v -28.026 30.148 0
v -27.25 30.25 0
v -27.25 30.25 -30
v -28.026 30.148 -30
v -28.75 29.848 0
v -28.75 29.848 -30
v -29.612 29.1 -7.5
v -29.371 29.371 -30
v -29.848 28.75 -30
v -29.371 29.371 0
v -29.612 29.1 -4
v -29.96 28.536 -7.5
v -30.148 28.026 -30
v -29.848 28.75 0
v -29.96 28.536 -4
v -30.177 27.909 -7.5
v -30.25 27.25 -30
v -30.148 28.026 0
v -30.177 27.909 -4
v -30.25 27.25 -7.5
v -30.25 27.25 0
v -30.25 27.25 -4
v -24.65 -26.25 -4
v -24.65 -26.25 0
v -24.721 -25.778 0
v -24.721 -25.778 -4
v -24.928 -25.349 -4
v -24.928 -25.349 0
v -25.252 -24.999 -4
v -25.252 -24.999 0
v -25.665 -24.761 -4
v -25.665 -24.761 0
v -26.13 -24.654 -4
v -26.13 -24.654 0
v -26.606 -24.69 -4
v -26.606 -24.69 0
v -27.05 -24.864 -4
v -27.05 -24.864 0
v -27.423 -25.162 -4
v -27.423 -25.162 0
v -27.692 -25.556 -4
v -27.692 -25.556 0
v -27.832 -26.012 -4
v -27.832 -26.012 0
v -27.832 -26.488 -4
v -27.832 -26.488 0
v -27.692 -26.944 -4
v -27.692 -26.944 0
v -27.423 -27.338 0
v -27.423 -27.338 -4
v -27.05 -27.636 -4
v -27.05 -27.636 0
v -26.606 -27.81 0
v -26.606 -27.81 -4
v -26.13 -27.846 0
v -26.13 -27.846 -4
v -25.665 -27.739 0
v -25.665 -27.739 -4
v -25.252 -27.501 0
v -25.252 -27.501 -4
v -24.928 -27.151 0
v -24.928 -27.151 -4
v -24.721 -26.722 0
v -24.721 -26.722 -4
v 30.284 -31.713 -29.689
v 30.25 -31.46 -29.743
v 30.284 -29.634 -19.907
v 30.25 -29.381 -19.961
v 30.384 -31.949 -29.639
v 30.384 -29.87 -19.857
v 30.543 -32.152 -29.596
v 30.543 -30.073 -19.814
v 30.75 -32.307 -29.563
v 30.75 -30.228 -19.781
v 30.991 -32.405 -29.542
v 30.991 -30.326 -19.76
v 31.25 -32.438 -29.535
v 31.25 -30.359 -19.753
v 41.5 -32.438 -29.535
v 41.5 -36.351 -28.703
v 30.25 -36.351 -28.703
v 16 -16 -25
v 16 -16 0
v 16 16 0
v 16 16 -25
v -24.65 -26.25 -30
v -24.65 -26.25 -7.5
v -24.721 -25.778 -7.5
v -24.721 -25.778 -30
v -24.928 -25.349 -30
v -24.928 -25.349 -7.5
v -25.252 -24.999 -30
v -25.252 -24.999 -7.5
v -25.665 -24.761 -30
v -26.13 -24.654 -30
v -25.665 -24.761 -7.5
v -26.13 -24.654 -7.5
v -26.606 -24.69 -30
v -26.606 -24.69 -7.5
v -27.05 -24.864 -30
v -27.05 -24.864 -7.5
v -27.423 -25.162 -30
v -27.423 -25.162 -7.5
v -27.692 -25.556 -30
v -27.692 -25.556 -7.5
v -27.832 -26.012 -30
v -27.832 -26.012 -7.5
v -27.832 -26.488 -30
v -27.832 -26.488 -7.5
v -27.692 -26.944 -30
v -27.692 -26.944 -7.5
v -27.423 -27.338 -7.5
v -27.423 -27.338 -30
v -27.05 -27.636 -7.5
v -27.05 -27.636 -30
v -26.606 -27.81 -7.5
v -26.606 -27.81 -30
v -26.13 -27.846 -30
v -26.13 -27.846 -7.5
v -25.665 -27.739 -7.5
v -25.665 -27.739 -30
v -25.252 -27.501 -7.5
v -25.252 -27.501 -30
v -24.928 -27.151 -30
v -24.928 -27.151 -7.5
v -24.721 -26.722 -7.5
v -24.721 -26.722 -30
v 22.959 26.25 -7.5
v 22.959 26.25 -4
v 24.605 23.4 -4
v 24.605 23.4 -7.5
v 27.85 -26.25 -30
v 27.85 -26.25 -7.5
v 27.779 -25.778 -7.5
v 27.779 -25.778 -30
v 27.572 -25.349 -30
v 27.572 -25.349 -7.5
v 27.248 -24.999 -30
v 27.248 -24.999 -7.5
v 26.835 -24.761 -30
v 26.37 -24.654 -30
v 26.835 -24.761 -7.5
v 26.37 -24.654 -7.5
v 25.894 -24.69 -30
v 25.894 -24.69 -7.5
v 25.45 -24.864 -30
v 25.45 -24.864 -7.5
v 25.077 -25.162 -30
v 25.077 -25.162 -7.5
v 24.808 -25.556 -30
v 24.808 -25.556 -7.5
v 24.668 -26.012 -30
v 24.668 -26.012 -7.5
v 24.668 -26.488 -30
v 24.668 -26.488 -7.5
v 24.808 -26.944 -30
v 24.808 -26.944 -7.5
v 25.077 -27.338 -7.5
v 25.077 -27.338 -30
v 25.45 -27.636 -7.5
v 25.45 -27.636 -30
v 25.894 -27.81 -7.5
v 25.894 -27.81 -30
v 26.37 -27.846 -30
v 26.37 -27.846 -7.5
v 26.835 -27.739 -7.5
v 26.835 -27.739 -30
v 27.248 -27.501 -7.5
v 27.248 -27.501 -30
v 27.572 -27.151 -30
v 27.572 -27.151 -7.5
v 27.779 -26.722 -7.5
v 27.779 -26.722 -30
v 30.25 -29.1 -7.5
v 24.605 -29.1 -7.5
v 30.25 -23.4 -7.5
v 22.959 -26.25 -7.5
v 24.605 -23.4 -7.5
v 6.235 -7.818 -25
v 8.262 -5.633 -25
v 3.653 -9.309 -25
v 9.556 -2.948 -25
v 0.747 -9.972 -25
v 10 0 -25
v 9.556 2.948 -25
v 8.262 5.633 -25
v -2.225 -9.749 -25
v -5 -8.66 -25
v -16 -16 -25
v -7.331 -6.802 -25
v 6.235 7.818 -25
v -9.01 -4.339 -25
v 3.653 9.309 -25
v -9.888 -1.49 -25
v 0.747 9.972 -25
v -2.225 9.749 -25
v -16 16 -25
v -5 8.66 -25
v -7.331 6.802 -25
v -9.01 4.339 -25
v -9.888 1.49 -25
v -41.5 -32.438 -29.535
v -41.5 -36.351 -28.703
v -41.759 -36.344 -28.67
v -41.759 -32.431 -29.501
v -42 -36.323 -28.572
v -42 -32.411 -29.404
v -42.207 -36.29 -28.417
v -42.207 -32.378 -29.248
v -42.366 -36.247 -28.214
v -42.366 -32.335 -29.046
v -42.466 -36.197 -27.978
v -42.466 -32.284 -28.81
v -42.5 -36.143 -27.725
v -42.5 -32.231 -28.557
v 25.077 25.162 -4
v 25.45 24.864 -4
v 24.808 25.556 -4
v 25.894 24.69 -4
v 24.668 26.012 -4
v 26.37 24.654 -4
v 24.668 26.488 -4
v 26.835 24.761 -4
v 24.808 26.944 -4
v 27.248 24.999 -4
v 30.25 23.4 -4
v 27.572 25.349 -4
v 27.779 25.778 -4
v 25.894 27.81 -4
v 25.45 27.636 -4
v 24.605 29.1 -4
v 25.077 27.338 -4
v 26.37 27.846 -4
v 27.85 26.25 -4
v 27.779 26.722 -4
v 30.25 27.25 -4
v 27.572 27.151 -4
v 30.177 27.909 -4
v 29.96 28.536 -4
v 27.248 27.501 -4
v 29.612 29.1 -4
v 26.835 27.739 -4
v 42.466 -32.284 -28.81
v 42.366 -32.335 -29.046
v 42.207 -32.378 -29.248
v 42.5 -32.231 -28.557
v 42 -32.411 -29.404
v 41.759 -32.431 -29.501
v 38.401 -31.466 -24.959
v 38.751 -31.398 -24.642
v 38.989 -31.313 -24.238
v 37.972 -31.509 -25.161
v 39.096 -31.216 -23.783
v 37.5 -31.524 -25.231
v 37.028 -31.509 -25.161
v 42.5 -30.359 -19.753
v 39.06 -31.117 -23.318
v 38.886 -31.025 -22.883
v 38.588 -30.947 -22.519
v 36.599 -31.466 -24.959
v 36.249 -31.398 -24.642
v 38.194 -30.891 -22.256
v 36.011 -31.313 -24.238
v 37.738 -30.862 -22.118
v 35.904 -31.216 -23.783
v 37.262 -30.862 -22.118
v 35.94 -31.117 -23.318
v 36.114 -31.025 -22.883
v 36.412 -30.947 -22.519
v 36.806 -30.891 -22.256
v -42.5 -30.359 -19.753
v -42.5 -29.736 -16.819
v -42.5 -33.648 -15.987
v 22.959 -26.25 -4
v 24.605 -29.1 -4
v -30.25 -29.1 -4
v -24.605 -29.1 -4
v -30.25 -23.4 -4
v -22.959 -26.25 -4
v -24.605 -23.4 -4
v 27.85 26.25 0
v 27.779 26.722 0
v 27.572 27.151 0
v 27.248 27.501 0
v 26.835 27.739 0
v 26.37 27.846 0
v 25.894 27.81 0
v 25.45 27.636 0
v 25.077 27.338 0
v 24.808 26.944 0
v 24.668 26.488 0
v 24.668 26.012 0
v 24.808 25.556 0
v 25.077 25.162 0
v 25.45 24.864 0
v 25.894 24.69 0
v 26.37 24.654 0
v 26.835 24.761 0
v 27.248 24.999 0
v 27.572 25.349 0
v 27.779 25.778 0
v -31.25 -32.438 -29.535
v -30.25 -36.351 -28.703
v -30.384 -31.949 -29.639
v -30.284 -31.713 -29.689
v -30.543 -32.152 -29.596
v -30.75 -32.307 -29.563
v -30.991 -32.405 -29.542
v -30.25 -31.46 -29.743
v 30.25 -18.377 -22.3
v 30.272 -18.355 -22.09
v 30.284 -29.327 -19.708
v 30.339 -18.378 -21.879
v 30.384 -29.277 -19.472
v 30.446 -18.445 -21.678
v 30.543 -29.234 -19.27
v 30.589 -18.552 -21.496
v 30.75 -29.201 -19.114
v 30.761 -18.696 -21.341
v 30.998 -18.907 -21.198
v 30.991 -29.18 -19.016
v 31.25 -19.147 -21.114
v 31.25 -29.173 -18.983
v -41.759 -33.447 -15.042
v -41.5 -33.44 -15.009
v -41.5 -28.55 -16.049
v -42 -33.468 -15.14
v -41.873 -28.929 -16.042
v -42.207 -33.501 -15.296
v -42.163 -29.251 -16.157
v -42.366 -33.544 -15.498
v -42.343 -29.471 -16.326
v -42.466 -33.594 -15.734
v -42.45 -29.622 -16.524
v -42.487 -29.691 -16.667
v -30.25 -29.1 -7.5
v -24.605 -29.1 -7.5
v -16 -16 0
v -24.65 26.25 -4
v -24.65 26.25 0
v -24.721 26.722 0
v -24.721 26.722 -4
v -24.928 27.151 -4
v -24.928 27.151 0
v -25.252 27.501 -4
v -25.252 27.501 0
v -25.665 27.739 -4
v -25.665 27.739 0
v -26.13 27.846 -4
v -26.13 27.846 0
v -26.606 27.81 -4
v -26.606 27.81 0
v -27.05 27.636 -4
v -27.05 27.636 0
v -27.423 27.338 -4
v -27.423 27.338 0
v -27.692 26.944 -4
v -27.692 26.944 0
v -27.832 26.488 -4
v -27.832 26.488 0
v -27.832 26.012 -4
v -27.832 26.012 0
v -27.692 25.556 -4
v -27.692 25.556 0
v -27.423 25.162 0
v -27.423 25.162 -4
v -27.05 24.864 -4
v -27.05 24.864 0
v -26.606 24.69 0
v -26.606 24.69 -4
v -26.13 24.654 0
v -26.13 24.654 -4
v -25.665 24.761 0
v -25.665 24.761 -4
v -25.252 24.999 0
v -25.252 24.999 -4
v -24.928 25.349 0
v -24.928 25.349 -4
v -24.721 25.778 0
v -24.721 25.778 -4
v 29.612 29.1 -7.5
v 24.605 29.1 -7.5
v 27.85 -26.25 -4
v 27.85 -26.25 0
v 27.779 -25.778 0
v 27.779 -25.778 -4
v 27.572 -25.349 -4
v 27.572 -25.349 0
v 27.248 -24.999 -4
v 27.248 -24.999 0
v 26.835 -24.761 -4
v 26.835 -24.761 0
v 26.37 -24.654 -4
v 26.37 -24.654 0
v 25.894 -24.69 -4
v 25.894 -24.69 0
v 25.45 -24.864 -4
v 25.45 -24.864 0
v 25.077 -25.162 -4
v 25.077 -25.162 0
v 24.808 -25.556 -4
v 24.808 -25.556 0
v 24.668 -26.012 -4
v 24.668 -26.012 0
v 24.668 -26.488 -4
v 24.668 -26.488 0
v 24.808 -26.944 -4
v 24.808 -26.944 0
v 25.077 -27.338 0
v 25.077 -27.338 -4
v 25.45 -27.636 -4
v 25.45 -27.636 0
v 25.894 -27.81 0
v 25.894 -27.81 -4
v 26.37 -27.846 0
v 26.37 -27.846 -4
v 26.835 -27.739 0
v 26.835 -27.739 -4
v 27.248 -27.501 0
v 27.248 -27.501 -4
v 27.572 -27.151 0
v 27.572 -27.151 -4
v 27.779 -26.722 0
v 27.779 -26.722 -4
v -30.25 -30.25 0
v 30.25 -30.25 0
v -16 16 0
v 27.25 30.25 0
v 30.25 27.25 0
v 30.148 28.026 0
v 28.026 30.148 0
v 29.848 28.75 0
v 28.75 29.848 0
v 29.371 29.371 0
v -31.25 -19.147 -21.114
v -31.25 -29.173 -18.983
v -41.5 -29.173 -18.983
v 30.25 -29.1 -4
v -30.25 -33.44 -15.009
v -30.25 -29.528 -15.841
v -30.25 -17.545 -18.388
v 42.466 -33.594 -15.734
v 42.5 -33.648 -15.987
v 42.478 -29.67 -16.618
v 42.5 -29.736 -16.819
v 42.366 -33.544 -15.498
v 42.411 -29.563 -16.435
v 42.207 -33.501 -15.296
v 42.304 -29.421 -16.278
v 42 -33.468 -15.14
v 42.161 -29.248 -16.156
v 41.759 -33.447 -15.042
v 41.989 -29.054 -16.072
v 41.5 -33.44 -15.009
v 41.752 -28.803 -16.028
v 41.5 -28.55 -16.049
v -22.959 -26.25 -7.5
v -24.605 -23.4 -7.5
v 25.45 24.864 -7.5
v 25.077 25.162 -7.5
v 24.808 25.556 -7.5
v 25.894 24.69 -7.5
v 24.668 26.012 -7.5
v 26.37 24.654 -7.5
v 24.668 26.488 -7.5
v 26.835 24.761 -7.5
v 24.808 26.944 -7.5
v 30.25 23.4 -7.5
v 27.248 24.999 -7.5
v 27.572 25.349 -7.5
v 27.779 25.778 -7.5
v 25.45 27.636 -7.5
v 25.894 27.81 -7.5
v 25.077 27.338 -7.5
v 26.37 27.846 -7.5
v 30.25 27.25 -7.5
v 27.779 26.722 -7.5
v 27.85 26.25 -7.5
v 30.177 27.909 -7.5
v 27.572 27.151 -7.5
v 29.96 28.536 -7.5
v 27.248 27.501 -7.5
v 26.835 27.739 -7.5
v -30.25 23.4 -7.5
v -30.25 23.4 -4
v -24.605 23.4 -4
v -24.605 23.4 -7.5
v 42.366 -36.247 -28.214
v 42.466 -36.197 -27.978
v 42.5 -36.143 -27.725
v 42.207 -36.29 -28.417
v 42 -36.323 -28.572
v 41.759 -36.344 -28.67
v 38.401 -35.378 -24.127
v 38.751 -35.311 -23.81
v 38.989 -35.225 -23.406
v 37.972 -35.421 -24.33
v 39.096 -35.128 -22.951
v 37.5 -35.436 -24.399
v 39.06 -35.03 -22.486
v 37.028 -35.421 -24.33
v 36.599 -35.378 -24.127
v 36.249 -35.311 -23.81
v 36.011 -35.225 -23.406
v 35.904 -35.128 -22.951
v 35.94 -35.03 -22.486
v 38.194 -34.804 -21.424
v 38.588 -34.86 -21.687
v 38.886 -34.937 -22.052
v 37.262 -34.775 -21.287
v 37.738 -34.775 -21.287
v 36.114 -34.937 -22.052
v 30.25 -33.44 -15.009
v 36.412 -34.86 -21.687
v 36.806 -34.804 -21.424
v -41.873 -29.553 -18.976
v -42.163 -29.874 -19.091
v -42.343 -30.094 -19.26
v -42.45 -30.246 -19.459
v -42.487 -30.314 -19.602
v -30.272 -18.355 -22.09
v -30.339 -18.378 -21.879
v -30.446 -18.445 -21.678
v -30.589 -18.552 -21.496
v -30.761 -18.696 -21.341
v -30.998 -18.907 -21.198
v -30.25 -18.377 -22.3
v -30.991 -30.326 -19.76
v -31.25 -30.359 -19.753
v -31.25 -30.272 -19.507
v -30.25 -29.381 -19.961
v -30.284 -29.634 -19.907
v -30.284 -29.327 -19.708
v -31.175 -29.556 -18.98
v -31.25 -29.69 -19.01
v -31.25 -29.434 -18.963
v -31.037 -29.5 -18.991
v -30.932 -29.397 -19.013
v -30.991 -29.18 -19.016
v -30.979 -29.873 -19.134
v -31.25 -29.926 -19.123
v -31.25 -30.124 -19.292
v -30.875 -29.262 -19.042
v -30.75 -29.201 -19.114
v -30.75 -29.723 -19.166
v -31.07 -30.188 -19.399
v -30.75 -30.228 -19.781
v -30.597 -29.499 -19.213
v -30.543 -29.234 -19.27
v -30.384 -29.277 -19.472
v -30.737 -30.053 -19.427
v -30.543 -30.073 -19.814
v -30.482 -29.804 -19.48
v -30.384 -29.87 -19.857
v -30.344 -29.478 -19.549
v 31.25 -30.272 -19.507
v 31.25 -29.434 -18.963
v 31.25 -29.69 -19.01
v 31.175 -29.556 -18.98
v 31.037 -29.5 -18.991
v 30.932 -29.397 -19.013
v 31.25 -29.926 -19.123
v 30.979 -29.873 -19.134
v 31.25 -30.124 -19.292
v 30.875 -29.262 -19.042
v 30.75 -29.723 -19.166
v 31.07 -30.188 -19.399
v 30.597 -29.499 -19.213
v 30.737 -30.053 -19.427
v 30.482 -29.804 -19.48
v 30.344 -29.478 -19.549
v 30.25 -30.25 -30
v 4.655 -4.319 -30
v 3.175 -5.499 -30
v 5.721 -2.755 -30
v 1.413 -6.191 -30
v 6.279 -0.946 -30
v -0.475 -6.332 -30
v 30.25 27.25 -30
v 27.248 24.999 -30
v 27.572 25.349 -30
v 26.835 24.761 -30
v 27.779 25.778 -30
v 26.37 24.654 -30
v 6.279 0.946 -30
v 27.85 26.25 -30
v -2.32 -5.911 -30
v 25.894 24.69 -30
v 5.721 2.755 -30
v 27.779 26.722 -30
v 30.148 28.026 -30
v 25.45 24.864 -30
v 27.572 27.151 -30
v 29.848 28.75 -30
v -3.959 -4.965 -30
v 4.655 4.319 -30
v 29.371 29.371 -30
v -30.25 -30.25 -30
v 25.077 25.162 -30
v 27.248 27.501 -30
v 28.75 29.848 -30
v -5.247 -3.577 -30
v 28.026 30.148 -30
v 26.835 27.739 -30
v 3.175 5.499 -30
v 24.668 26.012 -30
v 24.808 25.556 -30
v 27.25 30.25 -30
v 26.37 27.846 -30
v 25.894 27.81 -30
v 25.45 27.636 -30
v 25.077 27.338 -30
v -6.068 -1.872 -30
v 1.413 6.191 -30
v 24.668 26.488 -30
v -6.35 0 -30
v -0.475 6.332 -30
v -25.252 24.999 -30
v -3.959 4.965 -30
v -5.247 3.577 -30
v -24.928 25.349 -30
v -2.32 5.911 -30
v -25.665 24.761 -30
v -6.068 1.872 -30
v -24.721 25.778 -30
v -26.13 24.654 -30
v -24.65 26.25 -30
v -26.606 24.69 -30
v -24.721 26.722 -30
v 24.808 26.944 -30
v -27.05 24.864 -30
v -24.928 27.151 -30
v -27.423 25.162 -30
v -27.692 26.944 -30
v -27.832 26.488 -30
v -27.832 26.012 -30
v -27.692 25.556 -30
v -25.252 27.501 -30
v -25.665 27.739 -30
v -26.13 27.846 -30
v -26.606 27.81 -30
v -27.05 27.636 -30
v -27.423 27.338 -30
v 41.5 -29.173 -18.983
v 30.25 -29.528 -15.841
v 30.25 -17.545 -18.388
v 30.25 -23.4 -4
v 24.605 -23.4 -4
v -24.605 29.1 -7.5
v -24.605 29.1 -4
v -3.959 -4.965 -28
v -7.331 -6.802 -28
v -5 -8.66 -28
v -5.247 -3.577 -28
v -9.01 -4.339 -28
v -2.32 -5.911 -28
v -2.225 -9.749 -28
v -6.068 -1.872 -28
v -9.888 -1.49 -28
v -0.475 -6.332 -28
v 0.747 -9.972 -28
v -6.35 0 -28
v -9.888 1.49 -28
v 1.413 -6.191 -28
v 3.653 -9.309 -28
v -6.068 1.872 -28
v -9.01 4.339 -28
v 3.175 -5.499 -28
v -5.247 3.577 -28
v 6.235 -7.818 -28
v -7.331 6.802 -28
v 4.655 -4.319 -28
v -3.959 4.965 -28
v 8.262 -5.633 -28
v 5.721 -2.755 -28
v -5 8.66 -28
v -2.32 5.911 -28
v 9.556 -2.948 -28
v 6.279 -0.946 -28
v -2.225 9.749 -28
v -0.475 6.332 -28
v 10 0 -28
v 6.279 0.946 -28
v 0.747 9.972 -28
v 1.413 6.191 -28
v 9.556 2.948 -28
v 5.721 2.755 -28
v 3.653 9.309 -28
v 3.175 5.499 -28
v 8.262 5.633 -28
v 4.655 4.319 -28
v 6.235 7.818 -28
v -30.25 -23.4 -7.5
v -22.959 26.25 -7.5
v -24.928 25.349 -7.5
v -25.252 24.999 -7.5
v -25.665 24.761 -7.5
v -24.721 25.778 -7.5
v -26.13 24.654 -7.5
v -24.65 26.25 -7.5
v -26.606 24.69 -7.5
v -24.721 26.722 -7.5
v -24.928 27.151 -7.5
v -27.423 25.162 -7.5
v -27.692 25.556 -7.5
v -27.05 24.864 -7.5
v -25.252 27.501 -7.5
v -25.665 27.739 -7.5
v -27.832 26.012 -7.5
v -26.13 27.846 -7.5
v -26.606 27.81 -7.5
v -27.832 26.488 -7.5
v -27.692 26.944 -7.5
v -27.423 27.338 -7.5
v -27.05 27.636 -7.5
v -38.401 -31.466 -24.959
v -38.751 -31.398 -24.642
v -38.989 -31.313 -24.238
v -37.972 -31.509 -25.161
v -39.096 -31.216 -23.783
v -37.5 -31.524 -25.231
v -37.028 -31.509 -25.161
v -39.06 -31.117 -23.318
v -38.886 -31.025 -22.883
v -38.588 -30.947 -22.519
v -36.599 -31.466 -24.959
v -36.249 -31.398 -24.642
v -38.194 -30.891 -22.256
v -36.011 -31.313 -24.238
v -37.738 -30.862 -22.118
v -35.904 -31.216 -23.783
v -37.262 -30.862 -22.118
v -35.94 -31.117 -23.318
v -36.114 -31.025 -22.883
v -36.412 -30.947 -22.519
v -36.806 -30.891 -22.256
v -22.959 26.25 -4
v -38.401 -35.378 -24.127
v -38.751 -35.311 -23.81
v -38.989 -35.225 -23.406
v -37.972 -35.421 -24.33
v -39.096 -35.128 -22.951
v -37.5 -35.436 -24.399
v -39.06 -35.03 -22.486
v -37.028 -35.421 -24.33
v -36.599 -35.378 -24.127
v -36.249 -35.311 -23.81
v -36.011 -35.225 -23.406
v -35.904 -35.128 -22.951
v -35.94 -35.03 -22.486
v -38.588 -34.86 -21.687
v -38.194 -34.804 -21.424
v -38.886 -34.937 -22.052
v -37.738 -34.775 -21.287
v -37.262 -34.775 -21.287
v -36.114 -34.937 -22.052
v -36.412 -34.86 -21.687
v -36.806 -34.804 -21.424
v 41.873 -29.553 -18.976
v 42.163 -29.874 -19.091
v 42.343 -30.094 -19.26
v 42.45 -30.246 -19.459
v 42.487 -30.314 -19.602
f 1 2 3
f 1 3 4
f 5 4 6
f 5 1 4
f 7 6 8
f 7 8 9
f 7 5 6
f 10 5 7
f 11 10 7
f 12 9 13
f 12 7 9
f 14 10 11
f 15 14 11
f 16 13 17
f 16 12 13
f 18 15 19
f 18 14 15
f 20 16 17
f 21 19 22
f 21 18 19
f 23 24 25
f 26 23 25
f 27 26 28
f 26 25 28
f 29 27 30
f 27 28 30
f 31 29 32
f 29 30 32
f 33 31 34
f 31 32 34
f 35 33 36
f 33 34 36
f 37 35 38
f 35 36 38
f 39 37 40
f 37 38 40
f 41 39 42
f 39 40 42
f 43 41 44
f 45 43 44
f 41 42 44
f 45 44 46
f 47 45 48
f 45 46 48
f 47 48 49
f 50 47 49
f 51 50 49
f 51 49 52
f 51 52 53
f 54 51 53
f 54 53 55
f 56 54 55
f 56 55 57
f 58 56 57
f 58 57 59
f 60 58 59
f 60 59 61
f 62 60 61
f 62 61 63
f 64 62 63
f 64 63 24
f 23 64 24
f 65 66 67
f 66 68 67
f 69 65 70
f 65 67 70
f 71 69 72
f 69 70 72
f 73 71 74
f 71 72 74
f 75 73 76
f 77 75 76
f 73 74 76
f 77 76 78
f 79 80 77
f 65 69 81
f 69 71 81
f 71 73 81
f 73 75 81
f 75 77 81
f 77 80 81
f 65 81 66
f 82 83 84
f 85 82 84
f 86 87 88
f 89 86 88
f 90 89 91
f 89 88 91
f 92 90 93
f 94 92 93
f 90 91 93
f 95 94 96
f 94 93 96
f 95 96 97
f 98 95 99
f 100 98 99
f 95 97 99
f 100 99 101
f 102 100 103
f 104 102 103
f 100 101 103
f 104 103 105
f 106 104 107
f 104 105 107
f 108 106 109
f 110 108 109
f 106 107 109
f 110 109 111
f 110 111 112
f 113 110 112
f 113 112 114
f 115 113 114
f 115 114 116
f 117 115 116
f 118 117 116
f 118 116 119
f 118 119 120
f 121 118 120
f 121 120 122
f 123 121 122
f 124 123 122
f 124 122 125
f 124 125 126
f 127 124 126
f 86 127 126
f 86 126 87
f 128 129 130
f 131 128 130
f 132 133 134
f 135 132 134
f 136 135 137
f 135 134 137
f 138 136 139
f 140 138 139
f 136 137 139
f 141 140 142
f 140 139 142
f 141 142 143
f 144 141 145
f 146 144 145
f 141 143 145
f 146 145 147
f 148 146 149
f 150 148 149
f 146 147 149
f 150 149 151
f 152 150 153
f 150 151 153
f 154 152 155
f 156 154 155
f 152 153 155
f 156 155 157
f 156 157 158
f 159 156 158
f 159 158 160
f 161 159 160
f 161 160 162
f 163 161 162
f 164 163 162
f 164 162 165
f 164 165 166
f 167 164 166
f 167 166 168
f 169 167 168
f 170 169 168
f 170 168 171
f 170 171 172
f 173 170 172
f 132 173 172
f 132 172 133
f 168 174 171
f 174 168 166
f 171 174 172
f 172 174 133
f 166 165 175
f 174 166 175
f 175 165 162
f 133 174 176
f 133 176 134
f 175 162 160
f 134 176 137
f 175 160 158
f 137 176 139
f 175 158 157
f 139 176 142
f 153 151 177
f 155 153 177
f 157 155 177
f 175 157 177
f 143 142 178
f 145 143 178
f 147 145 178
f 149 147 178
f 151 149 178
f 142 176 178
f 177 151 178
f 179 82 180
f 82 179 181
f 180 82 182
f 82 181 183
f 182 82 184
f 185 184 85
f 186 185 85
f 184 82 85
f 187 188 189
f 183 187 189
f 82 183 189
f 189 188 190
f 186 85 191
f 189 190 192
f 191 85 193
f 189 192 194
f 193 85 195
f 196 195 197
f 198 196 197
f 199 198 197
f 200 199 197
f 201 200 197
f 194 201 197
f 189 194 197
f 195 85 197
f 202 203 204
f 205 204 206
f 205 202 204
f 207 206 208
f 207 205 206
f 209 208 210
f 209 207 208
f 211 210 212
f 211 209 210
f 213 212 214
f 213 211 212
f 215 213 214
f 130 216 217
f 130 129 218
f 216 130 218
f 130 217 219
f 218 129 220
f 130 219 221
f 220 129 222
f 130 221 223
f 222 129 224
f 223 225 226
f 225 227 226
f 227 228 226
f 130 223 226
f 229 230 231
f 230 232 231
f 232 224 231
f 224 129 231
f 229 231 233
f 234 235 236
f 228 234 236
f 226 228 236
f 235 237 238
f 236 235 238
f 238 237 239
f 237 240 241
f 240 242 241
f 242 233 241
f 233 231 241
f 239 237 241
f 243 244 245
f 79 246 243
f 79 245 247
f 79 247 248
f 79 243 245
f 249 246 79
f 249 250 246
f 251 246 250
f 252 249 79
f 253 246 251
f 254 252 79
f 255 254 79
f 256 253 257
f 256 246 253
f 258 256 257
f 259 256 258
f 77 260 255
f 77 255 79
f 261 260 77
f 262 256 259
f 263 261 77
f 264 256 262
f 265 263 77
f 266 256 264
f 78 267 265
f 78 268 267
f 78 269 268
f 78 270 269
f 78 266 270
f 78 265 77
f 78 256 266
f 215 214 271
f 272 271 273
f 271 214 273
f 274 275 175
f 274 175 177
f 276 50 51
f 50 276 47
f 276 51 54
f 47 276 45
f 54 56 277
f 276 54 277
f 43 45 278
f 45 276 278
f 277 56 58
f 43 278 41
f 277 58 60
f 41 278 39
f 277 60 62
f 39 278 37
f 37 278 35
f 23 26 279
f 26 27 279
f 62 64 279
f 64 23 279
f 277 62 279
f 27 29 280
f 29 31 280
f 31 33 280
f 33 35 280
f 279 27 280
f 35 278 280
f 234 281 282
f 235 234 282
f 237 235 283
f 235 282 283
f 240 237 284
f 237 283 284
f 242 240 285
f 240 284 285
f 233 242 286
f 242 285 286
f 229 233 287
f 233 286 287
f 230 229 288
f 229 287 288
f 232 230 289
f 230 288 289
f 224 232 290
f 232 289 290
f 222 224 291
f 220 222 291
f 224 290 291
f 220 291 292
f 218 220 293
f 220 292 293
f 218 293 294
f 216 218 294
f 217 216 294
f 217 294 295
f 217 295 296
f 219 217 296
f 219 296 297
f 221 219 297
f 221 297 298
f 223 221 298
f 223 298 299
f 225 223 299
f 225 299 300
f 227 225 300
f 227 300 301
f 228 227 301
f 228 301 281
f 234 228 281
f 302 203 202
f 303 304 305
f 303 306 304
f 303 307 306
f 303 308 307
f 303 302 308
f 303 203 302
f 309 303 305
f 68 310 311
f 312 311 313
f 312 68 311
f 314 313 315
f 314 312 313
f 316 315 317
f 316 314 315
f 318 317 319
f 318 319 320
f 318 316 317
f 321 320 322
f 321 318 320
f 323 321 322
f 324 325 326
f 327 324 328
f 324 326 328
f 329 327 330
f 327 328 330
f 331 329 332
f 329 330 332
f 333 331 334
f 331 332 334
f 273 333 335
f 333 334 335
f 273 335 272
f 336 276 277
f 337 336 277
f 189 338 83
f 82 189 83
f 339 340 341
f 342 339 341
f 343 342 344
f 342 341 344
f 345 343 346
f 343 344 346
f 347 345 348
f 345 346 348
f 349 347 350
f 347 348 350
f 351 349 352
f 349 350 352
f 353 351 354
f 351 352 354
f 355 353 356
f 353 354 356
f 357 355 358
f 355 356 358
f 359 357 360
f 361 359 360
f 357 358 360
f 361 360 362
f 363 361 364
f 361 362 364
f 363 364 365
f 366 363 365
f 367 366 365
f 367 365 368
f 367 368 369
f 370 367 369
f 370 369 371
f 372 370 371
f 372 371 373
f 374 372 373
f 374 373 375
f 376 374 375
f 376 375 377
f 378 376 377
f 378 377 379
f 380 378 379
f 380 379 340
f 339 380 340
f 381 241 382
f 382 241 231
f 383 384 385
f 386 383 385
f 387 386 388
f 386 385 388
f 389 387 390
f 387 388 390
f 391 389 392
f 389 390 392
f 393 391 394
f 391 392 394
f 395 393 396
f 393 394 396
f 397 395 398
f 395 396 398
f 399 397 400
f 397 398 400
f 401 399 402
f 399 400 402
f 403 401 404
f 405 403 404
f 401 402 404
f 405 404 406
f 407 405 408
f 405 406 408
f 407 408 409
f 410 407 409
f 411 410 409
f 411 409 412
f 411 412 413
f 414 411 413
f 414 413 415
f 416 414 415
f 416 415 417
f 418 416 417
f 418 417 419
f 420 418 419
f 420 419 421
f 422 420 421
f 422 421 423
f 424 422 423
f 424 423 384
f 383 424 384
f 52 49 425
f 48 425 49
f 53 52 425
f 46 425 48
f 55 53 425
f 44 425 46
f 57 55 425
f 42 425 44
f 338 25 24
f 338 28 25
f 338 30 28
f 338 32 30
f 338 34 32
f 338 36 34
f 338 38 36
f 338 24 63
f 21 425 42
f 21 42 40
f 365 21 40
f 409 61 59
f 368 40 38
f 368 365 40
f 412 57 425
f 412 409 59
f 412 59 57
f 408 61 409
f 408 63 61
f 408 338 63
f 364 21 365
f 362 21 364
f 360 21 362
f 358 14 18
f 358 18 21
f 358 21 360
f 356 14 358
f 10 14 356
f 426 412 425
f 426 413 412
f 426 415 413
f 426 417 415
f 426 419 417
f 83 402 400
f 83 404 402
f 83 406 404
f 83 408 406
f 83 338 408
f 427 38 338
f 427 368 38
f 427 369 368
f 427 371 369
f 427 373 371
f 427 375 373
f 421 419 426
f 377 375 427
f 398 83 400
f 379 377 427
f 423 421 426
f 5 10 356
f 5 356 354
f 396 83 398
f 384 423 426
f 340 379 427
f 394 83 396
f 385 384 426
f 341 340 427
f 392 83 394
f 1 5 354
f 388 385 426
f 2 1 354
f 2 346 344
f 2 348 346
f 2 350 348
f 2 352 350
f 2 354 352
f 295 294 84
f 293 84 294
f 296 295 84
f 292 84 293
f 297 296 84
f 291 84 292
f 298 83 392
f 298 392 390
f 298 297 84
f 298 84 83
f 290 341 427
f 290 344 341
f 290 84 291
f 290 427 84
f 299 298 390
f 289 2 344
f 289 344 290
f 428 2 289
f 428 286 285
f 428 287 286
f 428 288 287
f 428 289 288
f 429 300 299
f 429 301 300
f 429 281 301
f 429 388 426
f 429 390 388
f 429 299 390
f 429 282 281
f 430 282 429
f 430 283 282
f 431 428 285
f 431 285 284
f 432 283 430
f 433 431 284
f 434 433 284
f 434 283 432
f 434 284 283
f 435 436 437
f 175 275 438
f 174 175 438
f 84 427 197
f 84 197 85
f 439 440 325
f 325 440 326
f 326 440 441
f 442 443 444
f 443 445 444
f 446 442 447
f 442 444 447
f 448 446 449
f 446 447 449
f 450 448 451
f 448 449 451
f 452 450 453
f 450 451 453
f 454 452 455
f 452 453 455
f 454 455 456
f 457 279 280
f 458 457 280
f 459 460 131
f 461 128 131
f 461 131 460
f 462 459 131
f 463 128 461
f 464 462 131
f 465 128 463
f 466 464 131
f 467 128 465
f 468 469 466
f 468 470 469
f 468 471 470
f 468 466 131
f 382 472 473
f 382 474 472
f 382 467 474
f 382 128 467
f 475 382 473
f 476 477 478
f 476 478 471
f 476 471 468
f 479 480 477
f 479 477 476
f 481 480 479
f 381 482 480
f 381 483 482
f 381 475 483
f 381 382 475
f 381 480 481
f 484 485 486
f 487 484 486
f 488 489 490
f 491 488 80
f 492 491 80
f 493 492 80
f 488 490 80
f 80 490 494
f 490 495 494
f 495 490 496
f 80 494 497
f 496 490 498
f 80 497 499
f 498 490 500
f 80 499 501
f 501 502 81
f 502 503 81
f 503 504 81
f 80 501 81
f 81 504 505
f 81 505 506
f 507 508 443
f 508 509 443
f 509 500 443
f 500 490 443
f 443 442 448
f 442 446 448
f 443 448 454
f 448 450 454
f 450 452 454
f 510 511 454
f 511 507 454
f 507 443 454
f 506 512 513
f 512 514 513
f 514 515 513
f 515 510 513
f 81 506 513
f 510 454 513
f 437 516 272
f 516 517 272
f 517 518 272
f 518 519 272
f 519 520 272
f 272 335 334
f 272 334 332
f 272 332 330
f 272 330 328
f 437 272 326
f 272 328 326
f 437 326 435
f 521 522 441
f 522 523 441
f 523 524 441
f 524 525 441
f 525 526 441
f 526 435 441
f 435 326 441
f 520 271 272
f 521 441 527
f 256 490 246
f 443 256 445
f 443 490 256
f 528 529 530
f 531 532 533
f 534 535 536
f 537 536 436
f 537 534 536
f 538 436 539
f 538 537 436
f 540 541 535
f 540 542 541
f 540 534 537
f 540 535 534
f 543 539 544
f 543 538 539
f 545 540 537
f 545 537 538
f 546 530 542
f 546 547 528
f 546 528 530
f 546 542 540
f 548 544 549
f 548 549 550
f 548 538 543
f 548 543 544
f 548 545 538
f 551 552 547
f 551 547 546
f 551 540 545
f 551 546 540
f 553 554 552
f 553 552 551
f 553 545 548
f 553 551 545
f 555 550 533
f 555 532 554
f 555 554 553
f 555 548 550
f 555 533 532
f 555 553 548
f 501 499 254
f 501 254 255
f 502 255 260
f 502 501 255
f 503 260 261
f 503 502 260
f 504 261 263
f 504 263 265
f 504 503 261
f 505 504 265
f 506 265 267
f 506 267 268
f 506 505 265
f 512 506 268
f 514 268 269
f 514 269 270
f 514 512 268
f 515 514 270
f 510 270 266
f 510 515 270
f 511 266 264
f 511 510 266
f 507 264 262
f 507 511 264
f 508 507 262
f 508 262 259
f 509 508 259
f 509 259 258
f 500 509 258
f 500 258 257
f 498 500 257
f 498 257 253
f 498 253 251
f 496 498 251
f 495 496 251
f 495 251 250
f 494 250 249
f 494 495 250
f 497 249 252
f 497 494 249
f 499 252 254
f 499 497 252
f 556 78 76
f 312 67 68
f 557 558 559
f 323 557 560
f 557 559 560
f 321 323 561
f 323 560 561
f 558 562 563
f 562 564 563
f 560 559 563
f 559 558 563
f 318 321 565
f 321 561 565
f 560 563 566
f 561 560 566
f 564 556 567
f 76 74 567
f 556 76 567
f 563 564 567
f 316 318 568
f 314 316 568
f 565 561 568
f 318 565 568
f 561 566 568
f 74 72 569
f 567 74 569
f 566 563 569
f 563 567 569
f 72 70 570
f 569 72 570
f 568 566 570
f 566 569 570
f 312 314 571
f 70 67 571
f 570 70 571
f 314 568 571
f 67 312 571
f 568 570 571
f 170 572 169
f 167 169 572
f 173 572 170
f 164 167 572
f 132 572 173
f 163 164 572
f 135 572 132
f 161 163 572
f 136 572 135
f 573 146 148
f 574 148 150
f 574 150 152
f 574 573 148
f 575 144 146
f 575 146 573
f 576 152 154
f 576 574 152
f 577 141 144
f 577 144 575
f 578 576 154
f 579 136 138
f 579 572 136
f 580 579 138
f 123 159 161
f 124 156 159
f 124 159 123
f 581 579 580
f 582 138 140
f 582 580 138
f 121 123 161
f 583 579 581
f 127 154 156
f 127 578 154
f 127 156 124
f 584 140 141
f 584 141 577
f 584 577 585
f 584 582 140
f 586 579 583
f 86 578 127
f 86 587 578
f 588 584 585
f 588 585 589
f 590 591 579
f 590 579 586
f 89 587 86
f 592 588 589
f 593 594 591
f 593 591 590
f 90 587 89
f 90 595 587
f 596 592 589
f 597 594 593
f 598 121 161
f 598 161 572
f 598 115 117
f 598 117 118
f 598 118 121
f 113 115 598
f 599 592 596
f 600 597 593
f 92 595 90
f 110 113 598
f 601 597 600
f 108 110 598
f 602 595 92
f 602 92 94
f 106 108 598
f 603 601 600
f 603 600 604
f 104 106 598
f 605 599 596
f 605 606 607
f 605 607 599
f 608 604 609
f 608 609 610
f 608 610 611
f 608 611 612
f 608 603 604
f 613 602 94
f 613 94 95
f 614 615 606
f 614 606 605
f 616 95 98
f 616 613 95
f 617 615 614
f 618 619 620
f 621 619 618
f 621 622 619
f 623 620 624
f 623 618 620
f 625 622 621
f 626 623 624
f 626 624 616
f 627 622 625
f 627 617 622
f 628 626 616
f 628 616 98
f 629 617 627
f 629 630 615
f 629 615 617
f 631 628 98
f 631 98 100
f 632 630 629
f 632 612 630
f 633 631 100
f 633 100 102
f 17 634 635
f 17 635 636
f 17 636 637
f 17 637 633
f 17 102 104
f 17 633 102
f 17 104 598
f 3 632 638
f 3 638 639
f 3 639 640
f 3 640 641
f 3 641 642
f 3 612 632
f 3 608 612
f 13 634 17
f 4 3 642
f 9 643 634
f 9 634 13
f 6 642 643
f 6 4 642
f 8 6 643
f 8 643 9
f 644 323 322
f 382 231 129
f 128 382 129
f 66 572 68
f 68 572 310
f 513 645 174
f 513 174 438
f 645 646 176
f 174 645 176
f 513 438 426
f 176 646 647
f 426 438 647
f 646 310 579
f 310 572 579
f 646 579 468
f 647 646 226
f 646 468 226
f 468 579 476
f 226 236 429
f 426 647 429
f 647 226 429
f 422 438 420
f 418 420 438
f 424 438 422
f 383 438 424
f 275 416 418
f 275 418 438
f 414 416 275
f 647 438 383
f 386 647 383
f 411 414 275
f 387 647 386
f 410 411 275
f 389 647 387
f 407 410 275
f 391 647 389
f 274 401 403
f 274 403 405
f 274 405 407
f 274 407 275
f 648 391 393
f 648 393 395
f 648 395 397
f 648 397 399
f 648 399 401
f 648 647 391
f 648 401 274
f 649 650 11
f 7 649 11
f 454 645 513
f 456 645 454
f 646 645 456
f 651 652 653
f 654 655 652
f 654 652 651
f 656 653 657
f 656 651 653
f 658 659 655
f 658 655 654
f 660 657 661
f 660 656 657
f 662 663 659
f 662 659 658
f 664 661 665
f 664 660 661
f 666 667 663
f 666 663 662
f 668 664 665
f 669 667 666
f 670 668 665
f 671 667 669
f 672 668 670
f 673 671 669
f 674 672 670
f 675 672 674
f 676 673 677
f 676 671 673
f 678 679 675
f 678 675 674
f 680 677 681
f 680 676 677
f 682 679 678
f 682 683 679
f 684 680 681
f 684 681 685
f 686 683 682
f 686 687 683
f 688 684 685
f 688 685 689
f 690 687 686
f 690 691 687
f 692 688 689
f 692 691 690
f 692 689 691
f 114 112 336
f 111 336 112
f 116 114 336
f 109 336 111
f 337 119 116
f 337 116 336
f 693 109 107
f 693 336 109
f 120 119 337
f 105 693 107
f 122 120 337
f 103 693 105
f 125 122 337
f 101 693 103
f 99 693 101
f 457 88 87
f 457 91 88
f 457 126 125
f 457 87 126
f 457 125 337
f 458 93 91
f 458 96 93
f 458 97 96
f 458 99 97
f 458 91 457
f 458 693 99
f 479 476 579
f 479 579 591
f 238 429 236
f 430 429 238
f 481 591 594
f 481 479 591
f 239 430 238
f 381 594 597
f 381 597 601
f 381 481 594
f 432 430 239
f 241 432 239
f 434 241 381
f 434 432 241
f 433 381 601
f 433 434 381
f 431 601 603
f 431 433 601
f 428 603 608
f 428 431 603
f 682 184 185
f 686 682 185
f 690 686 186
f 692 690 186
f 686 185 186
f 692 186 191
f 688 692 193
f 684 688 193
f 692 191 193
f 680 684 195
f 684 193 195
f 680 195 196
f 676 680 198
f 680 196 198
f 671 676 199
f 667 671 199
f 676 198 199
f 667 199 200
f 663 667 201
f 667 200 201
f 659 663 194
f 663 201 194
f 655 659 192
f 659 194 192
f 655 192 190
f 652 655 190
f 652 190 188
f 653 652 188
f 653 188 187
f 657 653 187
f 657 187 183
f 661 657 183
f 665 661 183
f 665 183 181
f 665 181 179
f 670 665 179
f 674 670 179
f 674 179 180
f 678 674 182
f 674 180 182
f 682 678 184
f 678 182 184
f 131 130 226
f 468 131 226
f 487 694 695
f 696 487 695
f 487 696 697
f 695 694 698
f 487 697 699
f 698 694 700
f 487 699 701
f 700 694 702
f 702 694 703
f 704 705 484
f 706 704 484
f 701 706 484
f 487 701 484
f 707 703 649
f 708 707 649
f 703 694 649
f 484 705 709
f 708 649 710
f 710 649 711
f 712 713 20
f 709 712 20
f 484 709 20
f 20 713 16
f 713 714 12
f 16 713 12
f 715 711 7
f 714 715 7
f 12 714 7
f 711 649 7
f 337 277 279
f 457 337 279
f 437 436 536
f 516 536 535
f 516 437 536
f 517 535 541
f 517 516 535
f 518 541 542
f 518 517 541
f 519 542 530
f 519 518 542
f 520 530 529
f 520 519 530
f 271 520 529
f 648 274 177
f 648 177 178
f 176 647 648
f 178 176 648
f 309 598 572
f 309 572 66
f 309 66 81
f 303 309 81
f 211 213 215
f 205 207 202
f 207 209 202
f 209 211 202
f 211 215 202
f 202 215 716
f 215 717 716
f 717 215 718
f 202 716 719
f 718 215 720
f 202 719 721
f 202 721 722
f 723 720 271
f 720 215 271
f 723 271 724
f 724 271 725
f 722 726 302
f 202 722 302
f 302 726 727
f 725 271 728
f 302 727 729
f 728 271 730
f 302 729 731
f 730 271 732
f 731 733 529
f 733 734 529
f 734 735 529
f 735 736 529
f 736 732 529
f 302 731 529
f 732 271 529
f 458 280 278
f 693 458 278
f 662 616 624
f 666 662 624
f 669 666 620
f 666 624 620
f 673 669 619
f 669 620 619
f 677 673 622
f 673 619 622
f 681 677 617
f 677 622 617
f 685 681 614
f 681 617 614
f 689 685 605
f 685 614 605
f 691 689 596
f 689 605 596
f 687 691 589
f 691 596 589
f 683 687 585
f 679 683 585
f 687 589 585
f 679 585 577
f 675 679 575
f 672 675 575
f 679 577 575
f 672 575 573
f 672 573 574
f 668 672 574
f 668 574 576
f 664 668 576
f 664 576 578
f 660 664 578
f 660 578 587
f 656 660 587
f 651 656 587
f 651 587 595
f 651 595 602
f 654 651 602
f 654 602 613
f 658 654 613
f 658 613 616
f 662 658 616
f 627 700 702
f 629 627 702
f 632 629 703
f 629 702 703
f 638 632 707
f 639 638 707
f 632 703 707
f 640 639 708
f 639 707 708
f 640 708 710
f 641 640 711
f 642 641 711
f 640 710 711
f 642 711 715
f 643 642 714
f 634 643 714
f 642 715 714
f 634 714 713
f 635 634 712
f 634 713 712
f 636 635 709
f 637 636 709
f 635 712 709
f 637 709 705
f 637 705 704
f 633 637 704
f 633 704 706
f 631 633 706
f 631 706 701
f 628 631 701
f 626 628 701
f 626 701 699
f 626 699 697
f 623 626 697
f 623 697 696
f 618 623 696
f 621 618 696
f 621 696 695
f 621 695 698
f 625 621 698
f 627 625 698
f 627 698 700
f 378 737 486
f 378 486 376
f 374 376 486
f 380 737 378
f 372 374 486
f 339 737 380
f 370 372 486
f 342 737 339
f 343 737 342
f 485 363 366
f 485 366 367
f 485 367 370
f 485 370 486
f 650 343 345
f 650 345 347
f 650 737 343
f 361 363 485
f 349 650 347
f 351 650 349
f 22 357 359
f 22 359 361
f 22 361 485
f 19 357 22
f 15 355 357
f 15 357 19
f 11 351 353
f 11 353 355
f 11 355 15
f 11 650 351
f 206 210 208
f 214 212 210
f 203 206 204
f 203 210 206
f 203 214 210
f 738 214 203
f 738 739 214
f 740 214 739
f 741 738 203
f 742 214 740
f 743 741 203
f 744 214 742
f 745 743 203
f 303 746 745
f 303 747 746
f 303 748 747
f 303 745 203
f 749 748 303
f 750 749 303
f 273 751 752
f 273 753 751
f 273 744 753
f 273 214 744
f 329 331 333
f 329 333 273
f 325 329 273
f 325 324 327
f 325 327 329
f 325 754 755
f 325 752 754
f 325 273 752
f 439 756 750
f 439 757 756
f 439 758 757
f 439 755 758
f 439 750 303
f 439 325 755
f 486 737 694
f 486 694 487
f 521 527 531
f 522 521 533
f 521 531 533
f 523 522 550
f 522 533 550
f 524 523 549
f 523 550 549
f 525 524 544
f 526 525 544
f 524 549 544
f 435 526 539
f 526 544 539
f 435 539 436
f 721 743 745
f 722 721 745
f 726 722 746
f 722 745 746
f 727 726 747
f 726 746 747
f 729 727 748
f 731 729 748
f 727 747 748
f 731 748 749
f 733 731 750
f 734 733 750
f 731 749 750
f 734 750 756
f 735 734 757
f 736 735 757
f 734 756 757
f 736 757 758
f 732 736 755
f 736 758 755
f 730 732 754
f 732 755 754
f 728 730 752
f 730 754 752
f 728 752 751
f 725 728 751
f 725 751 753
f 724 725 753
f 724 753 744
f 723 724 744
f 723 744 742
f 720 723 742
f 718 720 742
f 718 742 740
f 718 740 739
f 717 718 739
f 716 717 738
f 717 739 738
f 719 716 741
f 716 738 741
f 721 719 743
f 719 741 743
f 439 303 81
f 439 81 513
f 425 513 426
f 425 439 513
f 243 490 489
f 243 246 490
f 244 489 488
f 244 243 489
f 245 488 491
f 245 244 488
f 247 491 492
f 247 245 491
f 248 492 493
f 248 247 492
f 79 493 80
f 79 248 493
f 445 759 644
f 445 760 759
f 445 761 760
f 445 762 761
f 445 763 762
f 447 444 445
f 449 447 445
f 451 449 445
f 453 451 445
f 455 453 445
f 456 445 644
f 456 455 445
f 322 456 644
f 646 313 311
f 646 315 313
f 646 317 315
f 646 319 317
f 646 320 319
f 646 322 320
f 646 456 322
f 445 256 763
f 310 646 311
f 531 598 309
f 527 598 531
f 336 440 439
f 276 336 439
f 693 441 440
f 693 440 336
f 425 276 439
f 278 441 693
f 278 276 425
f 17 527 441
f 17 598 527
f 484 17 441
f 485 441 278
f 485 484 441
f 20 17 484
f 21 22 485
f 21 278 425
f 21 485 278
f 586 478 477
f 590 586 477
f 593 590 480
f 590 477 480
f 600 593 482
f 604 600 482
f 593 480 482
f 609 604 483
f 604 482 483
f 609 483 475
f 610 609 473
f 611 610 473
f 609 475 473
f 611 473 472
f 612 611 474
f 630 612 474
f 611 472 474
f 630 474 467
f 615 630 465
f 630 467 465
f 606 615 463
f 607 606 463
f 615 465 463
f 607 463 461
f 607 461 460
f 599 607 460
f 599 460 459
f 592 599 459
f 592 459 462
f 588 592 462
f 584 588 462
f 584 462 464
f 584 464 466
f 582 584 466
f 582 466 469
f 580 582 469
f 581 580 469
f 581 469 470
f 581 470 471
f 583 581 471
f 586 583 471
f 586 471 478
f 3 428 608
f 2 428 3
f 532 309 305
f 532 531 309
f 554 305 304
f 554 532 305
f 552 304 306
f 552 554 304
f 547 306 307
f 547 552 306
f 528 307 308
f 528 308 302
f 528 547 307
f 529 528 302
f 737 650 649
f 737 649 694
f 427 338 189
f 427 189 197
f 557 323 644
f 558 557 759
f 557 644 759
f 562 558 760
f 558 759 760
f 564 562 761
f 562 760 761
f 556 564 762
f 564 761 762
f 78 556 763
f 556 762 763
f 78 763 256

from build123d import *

# Parameters (mm, degrees)
SKETCH_1_R          = 1.6
SKETCH_1_W          = 32
SKETCH_1_H          = 32
EXTRUDE_1_DEPTH     = 30
SKETCH_3_W          = 32
SKETCH_3_H          = 32
EXTRUDE_2_DEPTH     = 5
SKETCH_4_R          = 6.35
CUT_EXTRUDE_1_DEPTH = 53.250598083
SKETCH_5_R          = 10
CUT_EXTRUDE_2_DEPTH = 3
CUT_EXTRUDE_3_DEPTH = 3.5
EXTRUDE_3_DEPTH     = 60.5
SKETCH_14_W         = 12.25
SKETCH_14_H         = 14
SKETCH_14_R         = 1.6
EXTRUDE_4_DEPTH     = 4
EXTRUDE_5_DEPTH     = 3
FILLET_1_R          = 1


with BuildPart() as part:
    # ｽｹｯﾁ1 → ﾎﾞｽ - 押し出し1 (new body)
    with BuildSketch(Plane.XY):
        with BuildLine():
            Line((30.25, -30.25), (30.25, 27.25))
            ThreePointArc((30.25, 27.25), (29.371320344, 29.371320344), (27.25, 30.25))
            Line((27.25, 30.25), (-27.25, 30.25))
            ThreePointArc((-27.25, 30.25), (-29.371320344, 29.371320344), (-30.25, 27.25))
            Line((-30.25, 27.25), (-30.25, -30.25))
            Line((-30.25, -30.25), (30.25, -30.25))
        make_face()
        with Locations((-26.25, 26.25)):
            Circle(SKETCH_1_R, mode=Mode.SUBTRACT)
        with Locations((-26.25, -26.25)):
            Circle(SKETCH_1_R, mode=Mode.SUBTRACT)
        with Locations((26.25, -26.25)):
            Circle(SKETCH_1_R, mode=Mode.SUBTRACT)
        with Locations((26.25, 26.25)):
            Circle(SKETCH_1_R, mode=Mode.SUBTRACT)
        Rectangle(SKETCH_1_W, SKETCH_1_H, mode=Mode.SUBTRACT)
    extrude(amount=-EXTRUDE_1_DEPTH)

    # ｽｹｯﾁ3 → ﾎﾞｽ - 押し出し2 (add)
    with BuildSketch(Plane(origin=(0, 0, -30), x_dir=(-1, 0, 0), z_dir=(0, 0, -1))):
        Rectangle(SKETCH_3_W, SKETCH_3_H)
    extrude(amount=-EXTRUDE_2_DEPTH)

    # ｽｹｯﾁ4 → ｶｯﾄ - 押し出し1 (cut, through all)
    with BuildSketch(Plane(origin=(0, 0, -30), x_dir=(-1, 0, 0), z_dir=(0, 0, -1))):
        Circle(SKETCH_4_R)
    extrude(amount=-CUT_EXTRUDE_1_DEPTH, mode=Mode.SUBTRACT)

    # ｽｹｯﾁ5 → ｶｯﾄ - 押し出し2 (cut)
    with BuildSketch(Plane.XY.offset(-25)):
        Circle(SKETCH_5_R)
    extrude(amount=-CUT_EXTRUDE_2_DEPTH, mode=Mode.SUBTRACT)

    # ｽｹｯﾁ10 → ｶｯﾄ - 押し出し3 (cut)
    with BuildSketch(Plane.XY.offset(-4)):
        Polygon((27.895448267, -23.4), (30.25, -23.4), (30.25, -29.1), (27.895448267, -29.1), (24.604551733, -29.1), (22.959103466, -26.25), (24.604551733, -23.4), align=None)
        Polygon((-30.25, -29.1), (-27.895448267, -29.1), (-24.604551733, -29.1), (-22.959103466, -26.25), (-24.604551733, -23.4), (-27.895448267, -23.4), (-30.25, -23.4), align=None)
        Polygon((-27.895448267, 23.4), (-30.25, 23.4), (-30.25, 29.1), (-27.895448267, 29.1), (-24.604551733, 29.1), (-22.959103466, 26.25), (-24.604551733, 23.4), align=None)
        Polygon((30.25, 29.1), (27.895448267, 29.1), (24.604551733, 29.1), (22.959103466, 26.25), (24.604551733, 23.4), (27.895448267, 23.4), (30.25, 23.4), align=None)
    extrude(amount=-CUT_EXTRUDE_3_DEPTH, mode=Mode.SUBTRACT)

    # ｽｹｯﾁ13 → ﾎﾞｽ - 押し出し3 (add)
    with BuildSketch(Plane.ZY.offset(30.25)):
        Polygon((-30, -30.25), (-28.703181865, -36.351049646), (0, -30.25), align=None)
    extrude(amount=-EXTRUDE_3_DEPTH)

    # ｽｹｯﾁ14 → ﾎﾞｽ - 押し出し4 (add)
    with BuildSketch(Plane(origin=(0, -28.942375047, 6.151891727), x_dir=(1, 0, 0), z_dir=(0, -0.9781476007338057, 0.20791169081775968))):
        with Locations((-36.375, -28.633756669)):
            Rectangle(SKETCH_14_W, SKETCH_14_H)
        with Locations(Location((-37.5, -29.633756669, 0), (0, 0, 270))):
            Circle(SKETCH_14_R, mode=Mode.SUBTRACT)
    extrude_4 = extrude(amount=-EXTRUDE_4_DEPTH)

    # ｽｹｯﾁ16 → ﾎﾞｽ - 押し出し5 (add)
    with BuildSketch(Plane(origin=(0, -4.497910928, -21.161007181), x_dir=(1, 0, 0), z_dir=(0, 0.20791169081775962, 0.9781476007338056))):
        Polygon((-42.5, -25.588964922), (-30.25, -13.338964922), (-30.25, -25.588964922), align=None)
    extrude_5 = extrude(amount=-EXTRUDE_5_DEPTH)

    # ﾐﾗｰ1: ﾎﾞｽ - 押し出し4, ﾎﾞｽ - 押し出し5 across plane
    add(extrude_4.mirror(Plane(origin=(0, 0, 0), x_dir=(0, 0, 1), z_dir=(1, 0, 0))))
    add(extrude_5.mirror(Plane(origin=(0, 0, 0), x_dir=(0, 0, 1), z_dir=(1, 0, 0))))

    # ﾌｨﾚｯﾄ1
    fillet_1_edges = [part.edges().sort_by_distance(p)[0] for p in [
        (-30.25, -31.294944944, -24.155016824),
        (-42.5, -34.394754445, -29.119005246),
        (-42.5, -31.483990773, -15.424938836),
        (-36.375, -30.151430644, -18.77520502),
        (-30.25, -24.16027659, -20.048664126),
        (30.25, -31.294944944, -24.155016824),
        (42.5, -31.483990773, -15.424938836),
        (42.5, -34.394754445, -29.119005246),
        (36.375, -30.151430644, -18.77520502),
        (30.25, -24.16027659, -20.048664126),
    ]]
    fillet(fillet_1_edges, radius=FILLET_1_R)


solid = part.part
